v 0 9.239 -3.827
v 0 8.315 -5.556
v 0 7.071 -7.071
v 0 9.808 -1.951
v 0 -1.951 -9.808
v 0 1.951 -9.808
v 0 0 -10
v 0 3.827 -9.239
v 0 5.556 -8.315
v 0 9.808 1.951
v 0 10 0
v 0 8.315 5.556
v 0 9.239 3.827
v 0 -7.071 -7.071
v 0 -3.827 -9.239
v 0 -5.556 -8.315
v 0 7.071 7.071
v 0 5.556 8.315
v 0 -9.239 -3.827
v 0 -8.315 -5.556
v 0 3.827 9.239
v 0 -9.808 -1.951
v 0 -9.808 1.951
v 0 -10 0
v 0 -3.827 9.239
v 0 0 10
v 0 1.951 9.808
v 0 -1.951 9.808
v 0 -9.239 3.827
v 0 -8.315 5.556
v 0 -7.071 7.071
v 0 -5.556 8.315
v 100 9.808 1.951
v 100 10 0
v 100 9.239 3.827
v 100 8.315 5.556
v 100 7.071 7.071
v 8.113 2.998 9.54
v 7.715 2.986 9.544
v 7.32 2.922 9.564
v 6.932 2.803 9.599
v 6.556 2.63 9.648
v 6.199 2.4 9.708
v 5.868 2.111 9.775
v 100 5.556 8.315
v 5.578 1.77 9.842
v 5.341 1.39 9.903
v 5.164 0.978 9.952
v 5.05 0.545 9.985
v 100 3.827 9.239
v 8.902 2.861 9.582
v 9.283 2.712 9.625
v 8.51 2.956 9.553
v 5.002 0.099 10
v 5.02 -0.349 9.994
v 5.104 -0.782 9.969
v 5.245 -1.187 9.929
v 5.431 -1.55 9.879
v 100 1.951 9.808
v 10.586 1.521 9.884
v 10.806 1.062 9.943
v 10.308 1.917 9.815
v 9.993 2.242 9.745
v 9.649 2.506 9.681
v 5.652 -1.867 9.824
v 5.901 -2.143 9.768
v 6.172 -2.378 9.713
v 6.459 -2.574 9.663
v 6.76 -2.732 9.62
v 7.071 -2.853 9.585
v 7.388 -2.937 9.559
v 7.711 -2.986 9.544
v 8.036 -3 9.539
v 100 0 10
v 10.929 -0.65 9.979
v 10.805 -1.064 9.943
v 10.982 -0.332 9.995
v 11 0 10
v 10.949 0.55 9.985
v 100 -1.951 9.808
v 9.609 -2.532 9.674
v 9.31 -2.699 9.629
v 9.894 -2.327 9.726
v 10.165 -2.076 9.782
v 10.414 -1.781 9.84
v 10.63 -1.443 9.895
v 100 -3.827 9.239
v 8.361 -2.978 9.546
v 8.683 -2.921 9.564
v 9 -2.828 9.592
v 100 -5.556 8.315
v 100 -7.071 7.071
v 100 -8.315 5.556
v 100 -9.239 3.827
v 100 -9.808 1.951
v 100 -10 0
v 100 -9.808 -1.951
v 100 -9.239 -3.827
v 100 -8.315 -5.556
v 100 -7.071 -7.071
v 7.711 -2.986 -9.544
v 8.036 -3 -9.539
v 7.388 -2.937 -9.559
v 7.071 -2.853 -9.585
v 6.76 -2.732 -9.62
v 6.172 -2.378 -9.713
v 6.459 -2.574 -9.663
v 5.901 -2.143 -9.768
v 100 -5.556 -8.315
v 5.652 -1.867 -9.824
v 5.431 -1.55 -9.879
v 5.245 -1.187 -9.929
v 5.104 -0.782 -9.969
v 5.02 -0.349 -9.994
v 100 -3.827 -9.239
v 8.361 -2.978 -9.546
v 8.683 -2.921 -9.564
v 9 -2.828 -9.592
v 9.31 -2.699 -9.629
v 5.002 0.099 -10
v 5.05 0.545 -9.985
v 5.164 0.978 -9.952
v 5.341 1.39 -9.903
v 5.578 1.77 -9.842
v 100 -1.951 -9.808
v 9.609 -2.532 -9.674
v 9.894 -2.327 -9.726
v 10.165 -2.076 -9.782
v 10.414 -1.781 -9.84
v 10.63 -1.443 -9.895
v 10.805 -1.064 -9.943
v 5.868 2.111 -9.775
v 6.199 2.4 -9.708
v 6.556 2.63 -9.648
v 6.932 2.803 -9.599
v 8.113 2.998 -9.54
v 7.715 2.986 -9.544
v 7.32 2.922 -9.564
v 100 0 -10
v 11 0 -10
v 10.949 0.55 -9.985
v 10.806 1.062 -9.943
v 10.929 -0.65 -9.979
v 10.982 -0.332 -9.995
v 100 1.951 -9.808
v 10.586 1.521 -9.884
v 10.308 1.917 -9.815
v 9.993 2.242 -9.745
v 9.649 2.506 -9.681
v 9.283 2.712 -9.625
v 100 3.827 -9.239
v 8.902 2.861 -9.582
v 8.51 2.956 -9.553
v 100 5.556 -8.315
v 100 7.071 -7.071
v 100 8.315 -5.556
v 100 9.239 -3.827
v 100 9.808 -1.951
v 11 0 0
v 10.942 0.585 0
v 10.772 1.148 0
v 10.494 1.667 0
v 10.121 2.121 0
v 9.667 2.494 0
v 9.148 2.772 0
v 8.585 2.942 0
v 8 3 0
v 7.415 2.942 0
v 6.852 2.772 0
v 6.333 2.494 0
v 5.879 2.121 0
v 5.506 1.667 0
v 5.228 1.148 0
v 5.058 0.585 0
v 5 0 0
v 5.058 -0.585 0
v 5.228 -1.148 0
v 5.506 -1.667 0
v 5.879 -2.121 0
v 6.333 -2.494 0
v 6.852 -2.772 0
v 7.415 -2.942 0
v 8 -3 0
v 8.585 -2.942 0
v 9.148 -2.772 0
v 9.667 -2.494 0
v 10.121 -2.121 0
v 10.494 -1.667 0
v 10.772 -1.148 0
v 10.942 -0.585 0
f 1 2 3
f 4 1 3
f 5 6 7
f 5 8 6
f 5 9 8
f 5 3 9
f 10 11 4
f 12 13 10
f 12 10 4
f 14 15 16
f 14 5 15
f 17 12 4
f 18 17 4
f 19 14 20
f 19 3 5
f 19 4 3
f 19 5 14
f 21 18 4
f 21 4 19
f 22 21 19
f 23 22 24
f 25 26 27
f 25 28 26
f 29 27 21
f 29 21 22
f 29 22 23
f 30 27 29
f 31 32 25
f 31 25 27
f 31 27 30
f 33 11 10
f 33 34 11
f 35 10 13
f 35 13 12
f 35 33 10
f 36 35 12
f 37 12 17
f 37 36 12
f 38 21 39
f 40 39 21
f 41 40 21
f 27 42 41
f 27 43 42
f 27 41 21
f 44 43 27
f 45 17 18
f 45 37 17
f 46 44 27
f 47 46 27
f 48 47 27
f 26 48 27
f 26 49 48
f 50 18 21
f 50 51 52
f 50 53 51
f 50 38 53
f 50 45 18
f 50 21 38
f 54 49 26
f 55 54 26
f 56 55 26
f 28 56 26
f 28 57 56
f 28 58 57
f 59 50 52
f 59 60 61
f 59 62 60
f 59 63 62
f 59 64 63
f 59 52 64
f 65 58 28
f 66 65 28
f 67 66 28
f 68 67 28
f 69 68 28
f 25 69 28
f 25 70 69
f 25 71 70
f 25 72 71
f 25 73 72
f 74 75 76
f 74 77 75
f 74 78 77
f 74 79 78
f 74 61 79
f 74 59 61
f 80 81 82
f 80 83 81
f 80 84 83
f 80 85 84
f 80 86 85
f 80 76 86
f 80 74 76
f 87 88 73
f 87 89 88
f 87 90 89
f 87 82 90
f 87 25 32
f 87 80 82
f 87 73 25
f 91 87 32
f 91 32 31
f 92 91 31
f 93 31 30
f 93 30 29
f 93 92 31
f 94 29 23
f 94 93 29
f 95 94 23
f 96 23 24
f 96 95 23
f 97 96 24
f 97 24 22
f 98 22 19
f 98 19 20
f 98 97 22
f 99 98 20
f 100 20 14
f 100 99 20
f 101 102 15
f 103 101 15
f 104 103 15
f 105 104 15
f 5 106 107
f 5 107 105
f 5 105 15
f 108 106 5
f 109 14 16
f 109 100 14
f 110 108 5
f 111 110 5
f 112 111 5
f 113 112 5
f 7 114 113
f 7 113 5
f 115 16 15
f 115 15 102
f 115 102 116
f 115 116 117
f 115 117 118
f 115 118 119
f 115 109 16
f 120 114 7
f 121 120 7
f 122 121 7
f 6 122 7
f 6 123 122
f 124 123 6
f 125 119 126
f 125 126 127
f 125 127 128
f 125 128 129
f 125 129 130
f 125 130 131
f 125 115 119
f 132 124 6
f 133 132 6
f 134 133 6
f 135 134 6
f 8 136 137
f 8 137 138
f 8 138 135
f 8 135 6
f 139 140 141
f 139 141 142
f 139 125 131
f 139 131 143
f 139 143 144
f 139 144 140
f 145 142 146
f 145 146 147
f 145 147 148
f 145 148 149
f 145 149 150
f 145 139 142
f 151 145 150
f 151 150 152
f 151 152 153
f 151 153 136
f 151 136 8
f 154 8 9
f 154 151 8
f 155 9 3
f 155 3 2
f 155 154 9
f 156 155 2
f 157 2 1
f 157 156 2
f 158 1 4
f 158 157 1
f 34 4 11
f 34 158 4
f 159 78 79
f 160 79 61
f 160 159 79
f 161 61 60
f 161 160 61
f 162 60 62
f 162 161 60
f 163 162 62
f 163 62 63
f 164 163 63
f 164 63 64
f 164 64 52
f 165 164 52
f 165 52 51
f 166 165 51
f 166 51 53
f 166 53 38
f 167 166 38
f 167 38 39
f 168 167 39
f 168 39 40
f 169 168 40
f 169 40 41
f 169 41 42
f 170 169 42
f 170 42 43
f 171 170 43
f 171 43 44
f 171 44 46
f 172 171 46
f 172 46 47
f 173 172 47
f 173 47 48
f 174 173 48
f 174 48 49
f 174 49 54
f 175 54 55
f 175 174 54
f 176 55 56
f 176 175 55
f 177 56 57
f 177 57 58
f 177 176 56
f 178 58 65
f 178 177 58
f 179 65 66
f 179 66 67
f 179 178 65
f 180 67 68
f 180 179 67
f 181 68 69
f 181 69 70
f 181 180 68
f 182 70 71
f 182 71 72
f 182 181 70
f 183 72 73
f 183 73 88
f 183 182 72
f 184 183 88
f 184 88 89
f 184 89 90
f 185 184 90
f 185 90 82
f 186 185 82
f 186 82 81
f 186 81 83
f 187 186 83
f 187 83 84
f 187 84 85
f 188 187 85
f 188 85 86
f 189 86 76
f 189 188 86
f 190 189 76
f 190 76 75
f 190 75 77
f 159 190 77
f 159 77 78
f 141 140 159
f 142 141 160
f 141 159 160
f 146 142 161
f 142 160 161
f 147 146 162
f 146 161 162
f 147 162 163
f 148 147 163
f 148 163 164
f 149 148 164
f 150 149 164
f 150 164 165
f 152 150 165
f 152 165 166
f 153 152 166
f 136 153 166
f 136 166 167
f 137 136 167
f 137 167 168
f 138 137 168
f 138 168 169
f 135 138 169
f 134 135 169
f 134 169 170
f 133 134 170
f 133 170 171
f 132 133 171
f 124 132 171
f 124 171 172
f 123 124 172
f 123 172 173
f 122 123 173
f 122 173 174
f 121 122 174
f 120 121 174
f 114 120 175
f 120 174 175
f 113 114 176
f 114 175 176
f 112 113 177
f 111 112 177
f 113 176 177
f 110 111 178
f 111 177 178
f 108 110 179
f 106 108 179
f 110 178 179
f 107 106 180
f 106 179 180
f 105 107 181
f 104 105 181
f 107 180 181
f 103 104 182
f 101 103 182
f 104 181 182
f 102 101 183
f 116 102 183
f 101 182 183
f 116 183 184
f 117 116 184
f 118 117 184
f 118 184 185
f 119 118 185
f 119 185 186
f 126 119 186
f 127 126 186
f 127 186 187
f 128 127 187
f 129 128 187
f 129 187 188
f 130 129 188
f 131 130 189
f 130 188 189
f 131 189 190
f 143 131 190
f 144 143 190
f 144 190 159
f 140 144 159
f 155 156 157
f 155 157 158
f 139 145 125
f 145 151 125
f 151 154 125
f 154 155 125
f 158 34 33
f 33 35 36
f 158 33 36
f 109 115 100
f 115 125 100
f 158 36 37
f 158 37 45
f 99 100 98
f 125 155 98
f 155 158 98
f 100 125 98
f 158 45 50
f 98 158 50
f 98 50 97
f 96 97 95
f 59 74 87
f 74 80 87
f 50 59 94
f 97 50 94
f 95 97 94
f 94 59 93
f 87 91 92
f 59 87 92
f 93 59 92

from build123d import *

# Parameters (mm, degrees)
SKIZZE1_W                                   = 100
SKIZZE1_H                                   = 10
SCHNITT_LINEAR_AUSTRAGEN1_REACH             = 12
SKIZZE2_R                                   = 3
SCHNITT_LINEAR_AUSTRAGEN1_DIRECTION_2_REACH = 12


with BuildPart() as part:
    # Skizze1 → Rotation1 (revolve)
    with BuildSketch(Plane.XY):
        with Locations((50, 5)):
            Rectangle(SKIZZE1_W, SKIZZE1_H)
    revolve(axis=Axis((0, 0, 0), (1, 0, 0)))

    # Skizze2 → Schnitt-Linear austragen1 (cut, up to next)
    with BuildSketch(Plane.XY, mode=Mode.PRIVATE) as schnitt_linear_austragen1_sk1:
        with Locations((8, 0)):
            Circle(SKIZZE2_R)
    schnitt_linear_austragen1_tool1 = extrude(schnitt_linear_austragen1_sk1.sketch, amount=-SCHNITT_LINEAR_AUSTRAGEN1_REACH, mode=Mode.PRIVATE) & part.part
    add(schnitt_linear_austragen1_tool1.solids().sort_by_distance((8, 0, 0))[0], mode=Mode.SUBTRACT)

    # Skizze2 → Schnitt-Linear austragen1 direction 2 (cut, up to next)
    with BuildSketch(Plane.XY, mode=Mode.PRIVATE) as schnitt_linear_austragen1_direction_2_sk1:
        with Locations((8, 0)):
            Circle(SKIZZE2_R)
    schnitt_linear_austragen1_direction_2_tool1 = extrude(schnitt_linear_austragen1_direction_2_sk1.sketch, amount=SCHNITT_LINEAR_AUSTRAGEN1_DIRECTION_2_REACH, mode=Mode.PRIVATE) & part.part
    add(schnitt_linear_austragen1_direction_2_tool1.solids().sort_by_distance((8, 0, 0))[0], mode=Mode.SUBTRACT)


solid = part.part
